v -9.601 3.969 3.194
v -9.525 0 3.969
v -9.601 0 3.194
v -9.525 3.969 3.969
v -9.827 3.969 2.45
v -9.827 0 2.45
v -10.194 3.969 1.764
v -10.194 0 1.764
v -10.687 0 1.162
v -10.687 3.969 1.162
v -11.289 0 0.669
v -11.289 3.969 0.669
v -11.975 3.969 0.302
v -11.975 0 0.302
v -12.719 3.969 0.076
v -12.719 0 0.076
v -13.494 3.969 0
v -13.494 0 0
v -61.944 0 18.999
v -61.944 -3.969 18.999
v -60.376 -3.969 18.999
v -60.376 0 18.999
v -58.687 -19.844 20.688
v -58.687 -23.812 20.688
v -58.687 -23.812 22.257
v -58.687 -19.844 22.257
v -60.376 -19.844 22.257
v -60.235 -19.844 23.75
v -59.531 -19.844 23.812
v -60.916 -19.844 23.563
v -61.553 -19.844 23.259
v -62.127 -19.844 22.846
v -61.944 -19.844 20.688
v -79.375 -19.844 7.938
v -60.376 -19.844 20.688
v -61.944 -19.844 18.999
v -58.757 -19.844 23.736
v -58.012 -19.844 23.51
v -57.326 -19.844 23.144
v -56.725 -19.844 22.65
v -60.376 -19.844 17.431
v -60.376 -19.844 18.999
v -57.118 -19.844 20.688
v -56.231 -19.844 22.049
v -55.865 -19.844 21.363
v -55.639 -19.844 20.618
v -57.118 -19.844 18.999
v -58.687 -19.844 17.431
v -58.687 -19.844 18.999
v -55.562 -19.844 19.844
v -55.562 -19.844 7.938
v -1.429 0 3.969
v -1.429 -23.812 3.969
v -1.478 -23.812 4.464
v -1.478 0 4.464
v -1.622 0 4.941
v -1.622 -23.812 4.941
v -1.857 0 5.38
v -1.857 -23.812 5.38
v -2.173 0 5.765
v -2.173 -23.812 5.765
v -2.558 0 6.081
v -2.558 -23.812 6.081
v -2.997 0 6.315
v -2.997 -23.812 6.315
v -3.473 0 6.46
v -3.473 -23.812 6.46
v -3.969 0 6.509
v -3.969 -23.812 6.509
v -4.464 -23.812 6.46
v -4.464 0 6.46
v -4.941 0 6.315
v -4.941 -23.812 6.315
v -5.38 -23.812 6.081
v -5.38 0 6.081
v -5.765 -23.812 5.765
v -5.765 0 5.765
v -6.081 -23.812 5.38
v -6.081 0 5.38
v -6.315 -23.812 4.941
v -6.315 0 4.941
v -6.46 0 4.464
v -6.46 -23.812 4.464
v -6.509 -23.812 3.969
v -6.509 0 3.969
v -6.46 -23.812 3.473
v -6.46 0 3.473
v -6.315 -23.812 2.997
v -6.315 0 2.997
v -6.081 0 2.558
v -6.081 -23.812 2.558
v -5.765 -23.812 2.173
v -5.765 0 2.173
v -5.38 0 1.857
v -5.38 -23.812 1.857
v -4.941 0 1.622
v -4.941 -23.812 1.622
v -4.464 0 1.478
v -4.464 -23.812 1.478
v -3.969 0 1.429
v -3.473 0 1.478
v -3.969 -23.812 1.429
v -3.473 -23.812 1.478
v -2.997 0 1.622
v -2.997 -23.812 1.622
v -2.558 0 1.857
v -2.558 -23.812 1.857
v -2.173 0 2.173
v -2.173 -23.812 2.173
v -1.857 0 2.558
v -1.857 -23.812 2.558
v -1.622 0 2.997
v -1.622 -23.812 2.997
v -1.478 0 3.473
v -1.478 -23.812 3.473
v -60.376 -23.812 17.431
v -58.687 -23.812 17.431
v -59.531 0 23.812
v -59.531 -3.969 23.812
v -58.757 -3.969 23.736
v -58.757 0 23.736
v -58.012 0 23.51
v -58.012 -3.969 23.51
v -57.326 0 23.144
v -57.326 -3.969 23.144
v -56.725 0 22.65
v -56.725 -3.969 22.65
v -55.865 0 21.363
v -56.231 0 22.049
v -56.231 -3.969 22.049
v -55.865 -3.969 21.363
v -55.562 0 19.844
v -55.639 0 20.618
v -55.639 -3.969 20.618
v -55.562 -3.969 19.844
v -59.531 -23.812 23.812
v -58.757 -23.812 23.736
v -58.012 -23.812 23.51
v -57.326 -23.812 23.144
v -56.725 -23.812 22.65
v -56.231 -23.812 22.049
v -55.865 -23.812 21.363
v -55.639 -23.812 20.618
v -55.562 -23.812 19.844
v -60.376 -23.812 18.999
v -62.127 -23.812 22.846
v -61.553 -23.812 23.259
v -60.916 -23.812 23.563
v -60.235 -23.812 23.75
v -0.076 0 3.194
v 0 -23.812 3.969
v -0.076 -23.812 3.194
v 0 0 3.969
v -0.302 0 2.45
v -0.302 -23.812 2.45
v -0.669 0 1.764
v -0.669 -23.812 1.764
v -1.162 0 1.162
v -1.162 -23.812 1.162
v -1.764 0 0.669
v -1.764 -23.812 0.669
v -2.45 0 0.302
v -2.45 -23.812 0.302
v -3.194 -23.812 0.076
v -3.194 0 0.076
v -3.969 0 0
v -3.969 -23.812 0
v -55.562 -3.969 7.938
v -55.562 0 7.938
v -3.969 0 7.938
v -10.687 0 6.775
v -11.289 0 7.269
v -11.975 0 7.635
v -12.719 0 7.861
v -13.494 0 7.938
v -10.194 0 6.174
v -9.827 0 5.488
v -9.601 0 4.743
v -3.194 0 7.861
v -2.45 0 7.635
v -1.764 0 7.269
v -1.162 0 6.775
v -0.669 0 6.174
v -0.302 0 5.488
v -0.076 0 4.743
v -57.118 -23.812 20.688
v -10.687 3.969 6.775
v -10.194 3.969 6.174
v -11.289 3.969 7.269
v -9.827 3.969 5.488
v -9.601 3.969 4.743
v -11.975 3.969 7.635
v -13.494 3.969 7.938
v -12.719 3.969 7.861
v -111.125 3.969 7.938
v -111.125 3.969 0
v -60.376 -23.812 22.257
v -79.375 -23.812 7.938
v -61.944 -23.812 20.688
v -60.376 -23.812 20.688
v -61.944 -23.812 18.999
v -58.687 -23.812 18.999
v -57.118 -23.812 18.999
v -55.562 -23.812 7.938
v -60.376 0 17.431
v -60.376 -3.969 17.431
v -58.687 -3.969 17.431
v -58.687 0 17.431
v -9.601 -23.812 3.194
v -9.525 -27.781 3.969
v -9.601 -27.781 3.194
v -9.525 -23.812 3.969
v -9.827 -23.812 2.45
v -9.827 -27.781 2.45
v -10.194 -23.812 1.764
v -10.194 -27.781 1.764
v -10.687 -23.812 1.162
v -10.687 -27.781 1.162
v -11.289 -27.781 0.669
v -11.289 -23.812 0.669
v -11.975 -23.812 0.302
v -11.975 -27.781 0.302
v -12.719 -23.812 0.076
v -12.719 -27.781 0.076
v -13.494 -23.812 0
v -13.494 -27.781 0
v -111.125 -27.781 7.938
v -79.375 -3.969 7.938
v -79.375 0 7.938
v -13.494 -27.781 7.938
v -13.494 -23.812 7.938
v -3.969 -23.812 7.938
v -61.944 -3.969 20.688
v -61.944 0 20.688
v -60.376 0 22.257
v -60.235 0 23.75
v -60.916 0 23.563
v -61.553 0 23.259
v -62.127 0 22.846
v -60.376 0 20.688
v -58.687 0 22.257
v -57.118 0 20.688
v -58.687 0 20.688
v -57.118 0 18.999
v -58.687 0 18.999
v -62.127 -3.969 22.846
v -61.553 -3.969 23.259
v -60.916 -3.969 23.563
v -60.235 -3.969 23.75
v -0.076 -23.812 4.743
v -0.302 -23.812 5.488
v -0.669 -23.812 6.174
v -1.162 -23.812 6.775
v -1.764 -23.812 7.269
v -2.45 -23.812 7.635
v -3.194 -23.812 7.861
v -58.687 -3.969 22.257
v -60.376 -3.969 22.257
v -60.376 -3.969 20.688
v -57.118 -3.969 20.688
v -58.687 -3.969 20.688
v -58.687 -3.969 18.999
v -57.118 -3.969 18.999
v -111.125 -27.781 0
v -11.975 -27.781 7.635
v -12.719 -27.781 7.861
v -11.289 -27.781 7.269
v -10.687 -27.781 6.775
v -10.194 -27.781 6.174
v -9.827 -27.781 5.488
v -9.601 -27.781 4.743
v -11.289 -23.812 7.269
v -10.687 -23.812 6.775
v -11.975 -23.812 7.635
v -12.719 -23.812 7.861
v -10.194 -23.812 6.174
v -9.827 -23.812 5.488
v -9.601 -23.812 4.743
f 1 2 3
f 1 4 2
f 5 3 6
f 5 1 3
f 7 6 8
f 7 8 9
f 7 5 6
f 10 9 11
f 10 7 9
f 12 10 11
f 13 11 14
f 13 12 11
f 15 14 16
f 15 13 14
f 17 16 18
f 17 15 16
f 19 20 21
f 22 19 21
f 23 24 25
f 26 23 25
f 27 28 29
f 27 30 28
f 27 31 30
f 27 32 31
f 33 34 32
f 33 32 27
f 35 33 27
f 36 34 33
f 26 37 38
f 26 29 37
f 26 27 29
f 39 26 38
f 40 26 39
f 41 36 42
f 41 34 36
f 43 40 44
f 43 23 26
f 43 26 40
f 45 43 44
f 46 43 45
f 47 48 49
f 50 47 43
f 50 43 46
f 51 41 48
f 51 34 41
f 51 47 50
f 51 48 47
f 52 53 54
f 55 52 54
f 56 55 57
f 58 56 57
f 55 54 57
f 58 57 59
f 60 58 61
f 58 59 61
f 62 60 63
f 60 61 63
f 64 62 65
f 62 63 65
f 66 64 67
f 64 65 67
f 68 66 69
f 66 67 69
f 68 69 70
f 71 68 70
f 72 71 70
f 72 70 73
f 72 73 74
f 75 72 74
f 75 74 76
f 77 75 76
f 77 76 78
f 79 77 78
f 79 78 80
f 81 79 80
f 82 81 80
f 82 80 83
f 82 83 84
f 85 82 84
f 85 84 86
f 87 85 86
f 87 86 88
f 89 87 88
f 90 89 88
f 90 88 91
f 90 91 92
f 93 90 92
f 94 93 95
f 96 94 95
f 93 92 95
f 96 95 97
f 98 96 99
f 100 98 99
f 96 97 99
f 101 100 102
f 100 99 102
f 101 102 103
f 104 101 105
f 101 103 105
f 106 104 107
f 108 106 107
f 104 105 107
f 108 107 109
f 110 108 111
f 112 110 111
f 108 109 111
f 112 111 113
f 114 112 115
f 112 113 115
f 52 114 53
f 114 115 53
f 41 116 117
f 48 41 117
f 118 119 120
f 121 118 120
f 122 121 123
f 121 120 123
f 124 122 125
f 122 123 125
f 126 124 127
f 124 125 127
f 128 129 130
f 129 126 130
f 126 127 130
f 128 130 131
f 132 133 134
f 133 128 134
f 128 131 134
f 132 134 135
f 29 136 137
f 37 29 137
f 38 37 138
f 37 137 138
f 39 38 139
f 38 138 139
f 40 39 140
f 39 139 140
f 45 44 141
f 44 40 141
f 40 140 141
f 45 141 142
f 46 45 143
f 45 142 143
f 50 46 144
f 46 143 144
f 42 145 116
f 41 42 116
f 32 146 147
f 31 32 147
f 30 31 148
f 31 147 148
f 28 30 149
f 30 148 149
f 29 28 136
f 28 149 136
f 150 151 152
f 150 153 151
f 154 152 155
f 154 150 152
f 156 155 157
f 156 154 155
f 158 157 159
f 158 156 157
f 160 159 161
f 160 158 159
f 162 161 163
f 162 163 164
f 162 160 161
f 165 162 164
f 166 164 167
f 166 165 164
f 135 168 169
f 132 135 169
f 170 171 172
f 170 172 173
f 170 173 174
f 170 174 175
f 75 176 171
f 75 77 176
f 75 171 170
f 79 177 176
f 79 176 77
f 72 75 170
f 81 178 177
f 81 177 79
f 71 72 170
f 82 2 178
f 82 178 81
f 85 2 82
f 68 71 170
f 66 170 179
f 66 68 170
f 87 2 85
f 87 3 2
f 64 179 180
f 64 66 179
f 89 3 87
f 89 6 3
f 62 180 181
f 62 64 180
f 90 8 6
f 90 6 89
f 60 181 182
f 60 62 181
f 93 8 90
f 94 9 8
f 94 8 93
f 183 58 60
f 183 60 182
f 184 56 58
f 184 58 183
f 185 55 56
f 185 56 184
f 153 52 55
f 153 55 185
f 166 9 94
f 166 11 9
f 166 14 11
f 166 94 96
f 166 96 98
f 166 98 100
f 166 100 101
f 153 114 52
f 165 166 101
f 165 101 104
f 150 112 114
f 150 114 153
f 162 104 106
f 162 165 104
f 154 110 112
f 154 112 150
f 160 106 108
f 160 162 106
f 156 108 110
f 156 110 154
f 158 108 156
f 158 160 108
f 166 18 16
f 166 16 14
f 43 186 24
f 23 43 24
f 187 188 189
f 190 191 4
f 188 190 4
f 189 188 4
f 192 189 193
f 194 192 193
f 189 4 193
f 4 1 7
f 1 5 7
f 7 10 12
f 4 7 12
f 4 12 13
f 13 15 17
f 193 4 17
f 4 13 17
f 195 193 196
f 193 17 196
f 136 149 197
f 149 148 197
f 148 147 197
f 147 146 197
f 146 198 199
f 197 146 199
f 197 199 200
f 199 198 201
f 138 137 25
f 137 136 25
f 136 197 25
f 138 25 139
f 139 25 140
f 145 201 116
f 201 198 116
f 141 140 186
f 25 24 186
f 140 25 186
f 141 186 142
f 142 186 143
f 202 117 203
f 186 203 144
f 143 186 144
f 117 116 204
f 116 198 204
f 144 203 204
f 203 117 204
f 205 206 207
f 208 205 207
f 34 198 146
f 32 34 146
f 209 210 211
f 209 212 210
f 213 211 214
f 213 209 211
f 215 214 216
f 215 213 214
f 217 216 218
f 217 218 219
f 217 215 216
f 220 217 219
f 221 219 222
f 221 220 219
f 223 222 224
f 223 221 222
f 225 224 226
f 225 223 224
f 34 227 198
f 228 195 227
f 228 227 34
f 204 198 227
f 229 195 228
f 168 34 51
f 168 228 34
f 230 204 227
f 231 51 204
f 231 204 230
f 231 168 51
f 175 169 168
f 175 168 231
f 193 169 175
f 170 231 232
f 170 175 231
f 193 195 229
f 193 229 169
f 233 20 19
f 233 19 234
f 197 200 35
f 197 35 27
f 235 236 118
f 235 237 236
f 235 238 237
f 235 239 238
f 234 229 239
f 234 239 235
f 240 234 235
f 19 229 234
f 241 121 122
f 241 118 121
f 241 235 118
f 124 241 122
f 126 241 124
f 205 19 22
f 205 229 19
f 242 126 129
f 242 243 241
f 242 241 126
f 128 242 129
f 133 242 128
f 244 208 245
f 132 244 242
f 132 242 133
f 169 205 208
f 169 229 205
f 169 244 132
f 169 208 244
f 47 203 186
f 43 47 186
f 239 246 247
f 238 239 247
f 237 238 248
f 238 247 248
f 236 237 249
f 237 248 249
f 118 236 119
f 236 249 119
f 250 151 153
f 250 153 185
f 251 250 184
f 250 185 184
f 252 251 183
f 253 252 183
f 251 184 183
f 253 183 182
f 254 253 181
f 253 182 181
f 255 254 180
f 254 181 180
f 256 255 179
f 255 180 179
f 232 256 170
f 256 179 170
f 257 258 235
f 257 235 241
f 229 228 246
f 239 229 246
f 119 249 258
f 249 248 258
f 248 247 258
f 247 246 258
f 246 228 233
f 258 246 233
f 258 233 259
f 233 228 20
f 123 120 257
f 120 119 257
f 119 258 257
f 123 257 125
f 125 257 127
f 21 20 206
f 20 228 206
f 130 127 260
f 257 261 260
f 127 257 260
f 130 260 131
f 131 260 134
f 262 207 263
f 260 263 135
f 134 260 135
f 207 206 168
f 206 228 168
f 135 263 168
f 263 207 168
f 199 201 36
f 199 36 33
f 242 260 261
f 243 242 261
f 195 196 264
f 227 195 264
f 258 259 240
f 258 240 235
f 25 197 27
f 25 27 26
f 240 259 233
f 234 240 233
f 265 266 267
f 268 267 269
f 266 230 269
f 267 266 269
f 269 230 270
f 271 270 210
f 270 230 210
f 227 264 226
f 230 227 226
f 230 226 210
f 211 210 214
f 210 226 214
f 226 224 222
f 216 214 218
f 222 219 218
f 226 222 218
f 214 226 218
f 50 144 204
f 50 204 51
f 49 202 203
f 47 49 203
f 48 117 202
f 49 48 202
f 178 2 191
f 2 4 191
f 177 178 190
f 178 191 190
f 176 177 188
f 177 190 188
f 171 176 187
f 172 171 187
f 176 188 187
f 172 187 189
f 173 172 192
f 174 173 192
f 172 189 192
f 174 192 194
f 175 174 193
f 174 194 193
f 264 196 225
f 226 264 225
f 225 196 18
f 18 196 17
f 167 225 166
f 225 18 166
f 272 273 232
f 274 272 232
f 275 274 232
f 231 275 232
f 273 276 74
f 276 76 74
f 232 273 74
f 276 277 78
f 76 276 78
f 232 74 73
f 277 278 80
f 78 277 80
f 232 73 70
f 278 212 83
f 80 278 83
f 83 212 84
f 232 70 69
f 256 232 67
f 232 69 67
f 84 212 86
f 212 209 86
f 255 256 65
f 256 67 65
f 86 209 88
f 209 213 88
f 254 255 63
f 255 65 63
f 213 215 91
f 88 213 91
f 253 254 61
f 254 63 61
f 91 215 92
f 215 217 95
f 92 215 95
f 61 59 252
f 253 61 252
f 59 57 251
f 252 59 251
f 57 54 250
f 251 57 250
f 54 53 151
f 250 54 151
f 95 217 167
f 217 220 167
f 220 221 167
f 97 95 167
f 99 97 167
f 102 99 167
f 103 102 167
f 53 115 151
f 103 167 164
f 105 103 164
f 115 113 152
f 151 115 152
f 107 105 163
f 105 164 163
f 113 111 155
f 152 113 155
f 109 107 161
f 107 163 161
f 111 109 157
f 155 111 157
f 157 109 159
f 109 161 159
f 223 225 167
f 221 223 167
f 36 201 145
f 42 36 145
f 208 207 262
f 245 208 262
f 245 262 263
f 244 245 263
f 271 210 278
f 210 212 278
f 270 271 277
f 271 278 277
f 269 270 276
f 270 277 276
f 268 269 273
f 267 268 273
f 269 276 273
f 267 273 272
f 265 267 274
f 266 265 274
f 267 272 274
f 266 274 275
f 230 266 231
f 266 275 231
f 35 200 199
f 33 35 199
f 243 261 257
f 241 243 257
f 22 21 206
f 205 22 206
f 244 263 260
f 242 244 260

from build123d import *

# Parameters (mm, degrees)
F0_W     = 9.525
F0_H     = 23.8125
F1_DEPTH = 7.9375
F2_R     = 3.96874
F3_W     = 23.8125
F3_H     = 3.96875
F4_DEPTH = 15.875
F5_W     = 1.6891
F5_H     = 1.56845
F5_H_2   = 1.6891
F5_W_2   = 1.56845
F5_R     = 2.54
F6_DEPTH = 31.75


# Not quite as in the source:
# - a fillet or chamfer is up to 0.001 mm smaller than in the source, because OpenCascade refuses the exact size


with BuildPart() as f1:
    # F0 (on Top) → F1 (new body)
    with BuildSketch(Plane.XY):
        with Locations((-4.7625, -11.90625)):
            Rectangle(F0_W, F0_H)
        Polygon((-9.525, -23.8125), (-9.525, 0), (-9.525, 3.96875), (-111.125, 3.96875), (-111.125, -27.78125), (-9.525, -27.78125), align=None)
    extrude(amount=F1_DEPTH)

    # F2 (radius 3.96875 in the source; OpenCascade refuses exactly that, so slightly less here)
    f2_edges = [f1.edges().sort_by_distance(p)[0] for p in [
        (-9.525, -25.796875, 7.9375),
        (-9.525, -25.796875, 0),
        (0, -11.90625, 7.9375),
        (0, -11.90625, 0),
        (-9.525, 1.984375, 7.9375),
        (-9.525, 1.984375, 0),
    ]]
    fillet(f2_edges, radius=F2_R)

    # F3 (on face) → F4 (join)
    with BuildSketch(Plane.XY.offset(7.9375)):
        with Locations((-67.46875, -21.828125)):
            Rectangle(F3_W, F3_H)
        with Locations((-67.46875, -1.984375)):
            Rectangle(F3_W, F3_H)
    extrude(amount=F4_DEPTH)

    # F5 (on face) → F6 (cut, through all)
    with BuildSketch(Plane.XZ.offset(27.78125)):
        with BuildLine():
            Line((-55.5625, 23.8125), (-59.53125, 23.8125))
            ThreePointArc((-59.53125, 23.8125), (-56.7249199622, 22.6500800378), (-55.5625, 19.84375))
            Line((-55.5625, 19.84375), (-55.5625, 23.8125))
        make_face()
        with BuildLine():
            Line((-59.53125, 23.8125), (-79.375, 23.8125))
            Line((-79.375, 23.8125), (-79.375, 7.9375))
            Line((-79.375, 7.9375), (-62.126542618, 22.8463210299))
            ThreePointArc((-62.126542618, 22.8463210299), (-60.915902084, 23.5631202651), (-59.53125, 23.8125))
        make_face()
        with Locations((-59.53125, 18.214975)):
            Rectangle(F5_W, F5_H)
        with Locations((-59.53125, 19.84375)):
            Rectangle(F5_W, F5_H_2)
        with Locations((-57.902475, 19.84375)):
            Rectangle(F5_W_2, F5_H_2)
        with Locations((-61.160025, 19.84375)):
            Rectangle(F5_W_2, F5_H_2)
        with Locations((-59.53125, 21.472525)):
            Rectangle(F5_W, F5_H)
        with Locations((-3.96875, 3.96875)):
            Circle(F5_R)
    extrude(amount=-F6_DEPTH, mode=Mode.SUBTRACT)


solid = f1.part
